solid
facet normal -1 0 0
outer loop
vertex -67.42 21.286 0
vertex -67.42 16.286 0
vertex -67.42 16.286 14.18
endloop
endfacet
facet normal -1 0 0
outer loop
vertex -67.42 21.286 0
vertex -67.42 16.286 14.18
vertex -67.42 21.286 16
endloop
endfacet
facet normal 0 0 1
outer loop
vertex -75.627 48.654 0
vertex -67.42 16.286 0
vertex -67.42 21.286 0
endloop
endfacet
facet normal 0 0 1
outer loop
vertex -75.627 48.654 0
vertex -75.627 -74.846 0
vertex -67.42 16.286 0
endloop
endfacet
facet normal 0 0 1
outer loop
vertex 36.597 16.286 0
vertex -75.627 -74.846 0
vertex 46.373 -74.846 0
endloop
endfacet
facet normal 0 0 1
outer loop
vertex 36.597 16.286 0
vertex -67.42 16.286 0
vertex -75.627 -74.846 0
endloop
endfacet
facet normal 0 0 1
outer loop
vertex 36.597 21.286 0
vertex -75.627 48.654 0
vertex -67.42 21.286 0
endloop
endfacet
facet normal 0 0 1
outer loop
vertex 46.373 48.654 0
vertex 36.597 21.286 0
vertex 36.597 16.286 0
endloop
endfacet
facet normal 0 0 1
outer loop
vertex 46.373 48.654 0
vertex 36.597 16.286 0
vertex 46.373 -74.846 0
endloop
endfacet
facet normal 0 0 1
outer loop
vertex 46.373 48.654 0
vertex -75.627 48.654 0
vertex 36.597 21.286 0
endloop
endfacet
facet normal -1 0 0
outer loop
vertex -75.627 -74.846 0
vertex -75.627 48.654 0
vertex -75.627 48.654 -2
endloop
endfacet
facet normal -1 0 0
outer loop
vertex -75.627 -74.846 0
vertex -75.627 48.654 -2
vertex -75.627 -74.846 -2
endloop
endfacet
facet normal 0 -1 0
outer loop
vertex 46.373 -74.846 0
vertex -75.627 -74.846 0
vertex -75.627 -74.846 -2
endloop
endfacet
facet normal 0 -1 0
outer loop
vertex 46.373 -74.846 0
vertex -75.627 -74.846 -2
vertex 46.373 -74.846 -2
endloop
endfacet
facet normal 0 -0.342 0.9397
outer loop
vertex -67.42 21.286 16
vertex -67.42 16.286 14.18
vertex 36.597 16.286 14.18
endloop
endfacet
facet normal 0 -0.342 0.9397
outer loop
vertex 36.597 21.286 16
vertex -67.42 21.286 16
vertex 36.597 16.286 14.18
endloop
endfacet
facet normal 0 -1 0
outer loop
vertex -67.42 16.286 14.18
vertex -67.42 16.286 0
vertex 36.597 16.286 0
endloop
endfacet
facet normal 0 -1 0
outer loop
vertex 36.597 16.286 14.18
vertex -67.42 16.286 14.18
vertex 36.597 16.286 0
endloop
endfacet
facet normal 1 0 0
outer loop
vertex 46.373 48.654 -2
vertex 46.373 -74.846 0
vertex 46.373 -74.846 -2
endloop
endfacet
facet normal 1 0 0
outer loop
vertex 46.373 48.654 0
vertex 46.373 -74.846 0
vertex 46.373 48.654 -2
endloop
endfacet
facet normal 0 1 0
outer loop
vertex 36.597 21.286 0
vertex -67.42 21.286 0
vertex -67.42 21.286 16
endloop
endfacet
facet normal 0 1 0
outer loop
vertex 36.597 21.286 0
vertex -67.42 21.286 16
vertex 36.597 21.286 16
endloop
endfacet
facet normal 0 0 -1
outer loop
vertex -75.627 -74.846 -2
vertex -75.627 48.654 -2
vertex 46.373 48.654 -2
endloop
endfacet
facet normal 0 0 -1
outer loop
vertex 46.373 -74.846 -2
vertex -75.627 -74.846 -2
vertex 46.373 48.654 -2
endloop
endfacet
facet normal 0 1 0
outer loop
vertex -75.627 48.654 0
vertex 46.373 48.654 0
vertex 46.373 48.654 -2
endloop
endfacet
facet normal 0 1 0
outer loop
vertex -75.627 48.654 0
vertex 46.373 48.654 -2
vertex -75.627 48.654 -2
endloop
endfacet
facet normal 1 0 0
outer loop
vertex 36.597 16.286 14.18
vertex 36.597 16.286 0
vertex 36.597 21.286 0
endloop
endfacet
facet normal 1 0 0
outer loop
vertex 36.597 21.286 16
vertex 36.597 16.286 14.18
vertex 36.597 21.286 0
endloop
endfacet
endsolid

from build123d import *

# Parameters (mm, degrees)
F0_W     = 104.0173918009
F0_H     = 5
F1_DEPTH = 2
F2_DEPTH = 16
F3_SIZE2 = 1.819841
F3_SIZE  = 4.99999


# Not quite as in the source:
# - a fillet or chamfer is up to 0.001 mm smaller than in the source, because OpenCascade refuses the exact size


with BuildPart() as f1:
    # F0 (on Top) → F1 (new body)
    with BuildSketch(Plane.XY):
        Polygon((-72.627124867, 48.6539505273), (-75.627124867, 48.6539505273), (-75.627124867, -74.8460494727), (-72.627124867, -74.8460494727), (-14.627124867, -74.8460494727), (-14.3716531694, -74.8460494727), (43.372875133, -74.8460494727), (46.372875133, -74.8460494727), (46.372875133, 48.6539505273), (43.372875133, 48.6539505273), (-14.3716531694, 48.6539505273), (-14.627124867, 48.6539505273), (-14.8716531694, 48.6539505273), align=None)
        with Locations((-15.4112055898, 18.7856731331)):
            Rectangle(F0_W, F0_H, mode=Mode.SUBTRACT)
        with Locations((-15.4112055898, 18.7856731331)):
            Rectangle(F0_W, F0_H)
    extrude(amount=-F1_DEPTH)

    # F0 (on Top) → F2 (join)
    with BuildSketch(Plane.XY):
        with Locations((-15.4112055898, 18.7856731331)):
            Rectangle(F0_W, F0_H)
    extrude(amount=F2_DEPTH)

    # F3 (size 5 and 1.8198511713 in the source; OpenCascade refuses exactly that, so slightly less here)
    f3_edges = [f1.edges().sort_by_distance(p)[0] for p in [
        (-15.411206, 16.285673, 16),
    ]]
    f3_side = f1.faces().sort_by_distance((-15.411206, 18.785673, 16))[0]
    chamfer(f3_edges, length=F3_SIZE, length2=F3_SIZE2, reference=f3_side)


solid = f1.part
